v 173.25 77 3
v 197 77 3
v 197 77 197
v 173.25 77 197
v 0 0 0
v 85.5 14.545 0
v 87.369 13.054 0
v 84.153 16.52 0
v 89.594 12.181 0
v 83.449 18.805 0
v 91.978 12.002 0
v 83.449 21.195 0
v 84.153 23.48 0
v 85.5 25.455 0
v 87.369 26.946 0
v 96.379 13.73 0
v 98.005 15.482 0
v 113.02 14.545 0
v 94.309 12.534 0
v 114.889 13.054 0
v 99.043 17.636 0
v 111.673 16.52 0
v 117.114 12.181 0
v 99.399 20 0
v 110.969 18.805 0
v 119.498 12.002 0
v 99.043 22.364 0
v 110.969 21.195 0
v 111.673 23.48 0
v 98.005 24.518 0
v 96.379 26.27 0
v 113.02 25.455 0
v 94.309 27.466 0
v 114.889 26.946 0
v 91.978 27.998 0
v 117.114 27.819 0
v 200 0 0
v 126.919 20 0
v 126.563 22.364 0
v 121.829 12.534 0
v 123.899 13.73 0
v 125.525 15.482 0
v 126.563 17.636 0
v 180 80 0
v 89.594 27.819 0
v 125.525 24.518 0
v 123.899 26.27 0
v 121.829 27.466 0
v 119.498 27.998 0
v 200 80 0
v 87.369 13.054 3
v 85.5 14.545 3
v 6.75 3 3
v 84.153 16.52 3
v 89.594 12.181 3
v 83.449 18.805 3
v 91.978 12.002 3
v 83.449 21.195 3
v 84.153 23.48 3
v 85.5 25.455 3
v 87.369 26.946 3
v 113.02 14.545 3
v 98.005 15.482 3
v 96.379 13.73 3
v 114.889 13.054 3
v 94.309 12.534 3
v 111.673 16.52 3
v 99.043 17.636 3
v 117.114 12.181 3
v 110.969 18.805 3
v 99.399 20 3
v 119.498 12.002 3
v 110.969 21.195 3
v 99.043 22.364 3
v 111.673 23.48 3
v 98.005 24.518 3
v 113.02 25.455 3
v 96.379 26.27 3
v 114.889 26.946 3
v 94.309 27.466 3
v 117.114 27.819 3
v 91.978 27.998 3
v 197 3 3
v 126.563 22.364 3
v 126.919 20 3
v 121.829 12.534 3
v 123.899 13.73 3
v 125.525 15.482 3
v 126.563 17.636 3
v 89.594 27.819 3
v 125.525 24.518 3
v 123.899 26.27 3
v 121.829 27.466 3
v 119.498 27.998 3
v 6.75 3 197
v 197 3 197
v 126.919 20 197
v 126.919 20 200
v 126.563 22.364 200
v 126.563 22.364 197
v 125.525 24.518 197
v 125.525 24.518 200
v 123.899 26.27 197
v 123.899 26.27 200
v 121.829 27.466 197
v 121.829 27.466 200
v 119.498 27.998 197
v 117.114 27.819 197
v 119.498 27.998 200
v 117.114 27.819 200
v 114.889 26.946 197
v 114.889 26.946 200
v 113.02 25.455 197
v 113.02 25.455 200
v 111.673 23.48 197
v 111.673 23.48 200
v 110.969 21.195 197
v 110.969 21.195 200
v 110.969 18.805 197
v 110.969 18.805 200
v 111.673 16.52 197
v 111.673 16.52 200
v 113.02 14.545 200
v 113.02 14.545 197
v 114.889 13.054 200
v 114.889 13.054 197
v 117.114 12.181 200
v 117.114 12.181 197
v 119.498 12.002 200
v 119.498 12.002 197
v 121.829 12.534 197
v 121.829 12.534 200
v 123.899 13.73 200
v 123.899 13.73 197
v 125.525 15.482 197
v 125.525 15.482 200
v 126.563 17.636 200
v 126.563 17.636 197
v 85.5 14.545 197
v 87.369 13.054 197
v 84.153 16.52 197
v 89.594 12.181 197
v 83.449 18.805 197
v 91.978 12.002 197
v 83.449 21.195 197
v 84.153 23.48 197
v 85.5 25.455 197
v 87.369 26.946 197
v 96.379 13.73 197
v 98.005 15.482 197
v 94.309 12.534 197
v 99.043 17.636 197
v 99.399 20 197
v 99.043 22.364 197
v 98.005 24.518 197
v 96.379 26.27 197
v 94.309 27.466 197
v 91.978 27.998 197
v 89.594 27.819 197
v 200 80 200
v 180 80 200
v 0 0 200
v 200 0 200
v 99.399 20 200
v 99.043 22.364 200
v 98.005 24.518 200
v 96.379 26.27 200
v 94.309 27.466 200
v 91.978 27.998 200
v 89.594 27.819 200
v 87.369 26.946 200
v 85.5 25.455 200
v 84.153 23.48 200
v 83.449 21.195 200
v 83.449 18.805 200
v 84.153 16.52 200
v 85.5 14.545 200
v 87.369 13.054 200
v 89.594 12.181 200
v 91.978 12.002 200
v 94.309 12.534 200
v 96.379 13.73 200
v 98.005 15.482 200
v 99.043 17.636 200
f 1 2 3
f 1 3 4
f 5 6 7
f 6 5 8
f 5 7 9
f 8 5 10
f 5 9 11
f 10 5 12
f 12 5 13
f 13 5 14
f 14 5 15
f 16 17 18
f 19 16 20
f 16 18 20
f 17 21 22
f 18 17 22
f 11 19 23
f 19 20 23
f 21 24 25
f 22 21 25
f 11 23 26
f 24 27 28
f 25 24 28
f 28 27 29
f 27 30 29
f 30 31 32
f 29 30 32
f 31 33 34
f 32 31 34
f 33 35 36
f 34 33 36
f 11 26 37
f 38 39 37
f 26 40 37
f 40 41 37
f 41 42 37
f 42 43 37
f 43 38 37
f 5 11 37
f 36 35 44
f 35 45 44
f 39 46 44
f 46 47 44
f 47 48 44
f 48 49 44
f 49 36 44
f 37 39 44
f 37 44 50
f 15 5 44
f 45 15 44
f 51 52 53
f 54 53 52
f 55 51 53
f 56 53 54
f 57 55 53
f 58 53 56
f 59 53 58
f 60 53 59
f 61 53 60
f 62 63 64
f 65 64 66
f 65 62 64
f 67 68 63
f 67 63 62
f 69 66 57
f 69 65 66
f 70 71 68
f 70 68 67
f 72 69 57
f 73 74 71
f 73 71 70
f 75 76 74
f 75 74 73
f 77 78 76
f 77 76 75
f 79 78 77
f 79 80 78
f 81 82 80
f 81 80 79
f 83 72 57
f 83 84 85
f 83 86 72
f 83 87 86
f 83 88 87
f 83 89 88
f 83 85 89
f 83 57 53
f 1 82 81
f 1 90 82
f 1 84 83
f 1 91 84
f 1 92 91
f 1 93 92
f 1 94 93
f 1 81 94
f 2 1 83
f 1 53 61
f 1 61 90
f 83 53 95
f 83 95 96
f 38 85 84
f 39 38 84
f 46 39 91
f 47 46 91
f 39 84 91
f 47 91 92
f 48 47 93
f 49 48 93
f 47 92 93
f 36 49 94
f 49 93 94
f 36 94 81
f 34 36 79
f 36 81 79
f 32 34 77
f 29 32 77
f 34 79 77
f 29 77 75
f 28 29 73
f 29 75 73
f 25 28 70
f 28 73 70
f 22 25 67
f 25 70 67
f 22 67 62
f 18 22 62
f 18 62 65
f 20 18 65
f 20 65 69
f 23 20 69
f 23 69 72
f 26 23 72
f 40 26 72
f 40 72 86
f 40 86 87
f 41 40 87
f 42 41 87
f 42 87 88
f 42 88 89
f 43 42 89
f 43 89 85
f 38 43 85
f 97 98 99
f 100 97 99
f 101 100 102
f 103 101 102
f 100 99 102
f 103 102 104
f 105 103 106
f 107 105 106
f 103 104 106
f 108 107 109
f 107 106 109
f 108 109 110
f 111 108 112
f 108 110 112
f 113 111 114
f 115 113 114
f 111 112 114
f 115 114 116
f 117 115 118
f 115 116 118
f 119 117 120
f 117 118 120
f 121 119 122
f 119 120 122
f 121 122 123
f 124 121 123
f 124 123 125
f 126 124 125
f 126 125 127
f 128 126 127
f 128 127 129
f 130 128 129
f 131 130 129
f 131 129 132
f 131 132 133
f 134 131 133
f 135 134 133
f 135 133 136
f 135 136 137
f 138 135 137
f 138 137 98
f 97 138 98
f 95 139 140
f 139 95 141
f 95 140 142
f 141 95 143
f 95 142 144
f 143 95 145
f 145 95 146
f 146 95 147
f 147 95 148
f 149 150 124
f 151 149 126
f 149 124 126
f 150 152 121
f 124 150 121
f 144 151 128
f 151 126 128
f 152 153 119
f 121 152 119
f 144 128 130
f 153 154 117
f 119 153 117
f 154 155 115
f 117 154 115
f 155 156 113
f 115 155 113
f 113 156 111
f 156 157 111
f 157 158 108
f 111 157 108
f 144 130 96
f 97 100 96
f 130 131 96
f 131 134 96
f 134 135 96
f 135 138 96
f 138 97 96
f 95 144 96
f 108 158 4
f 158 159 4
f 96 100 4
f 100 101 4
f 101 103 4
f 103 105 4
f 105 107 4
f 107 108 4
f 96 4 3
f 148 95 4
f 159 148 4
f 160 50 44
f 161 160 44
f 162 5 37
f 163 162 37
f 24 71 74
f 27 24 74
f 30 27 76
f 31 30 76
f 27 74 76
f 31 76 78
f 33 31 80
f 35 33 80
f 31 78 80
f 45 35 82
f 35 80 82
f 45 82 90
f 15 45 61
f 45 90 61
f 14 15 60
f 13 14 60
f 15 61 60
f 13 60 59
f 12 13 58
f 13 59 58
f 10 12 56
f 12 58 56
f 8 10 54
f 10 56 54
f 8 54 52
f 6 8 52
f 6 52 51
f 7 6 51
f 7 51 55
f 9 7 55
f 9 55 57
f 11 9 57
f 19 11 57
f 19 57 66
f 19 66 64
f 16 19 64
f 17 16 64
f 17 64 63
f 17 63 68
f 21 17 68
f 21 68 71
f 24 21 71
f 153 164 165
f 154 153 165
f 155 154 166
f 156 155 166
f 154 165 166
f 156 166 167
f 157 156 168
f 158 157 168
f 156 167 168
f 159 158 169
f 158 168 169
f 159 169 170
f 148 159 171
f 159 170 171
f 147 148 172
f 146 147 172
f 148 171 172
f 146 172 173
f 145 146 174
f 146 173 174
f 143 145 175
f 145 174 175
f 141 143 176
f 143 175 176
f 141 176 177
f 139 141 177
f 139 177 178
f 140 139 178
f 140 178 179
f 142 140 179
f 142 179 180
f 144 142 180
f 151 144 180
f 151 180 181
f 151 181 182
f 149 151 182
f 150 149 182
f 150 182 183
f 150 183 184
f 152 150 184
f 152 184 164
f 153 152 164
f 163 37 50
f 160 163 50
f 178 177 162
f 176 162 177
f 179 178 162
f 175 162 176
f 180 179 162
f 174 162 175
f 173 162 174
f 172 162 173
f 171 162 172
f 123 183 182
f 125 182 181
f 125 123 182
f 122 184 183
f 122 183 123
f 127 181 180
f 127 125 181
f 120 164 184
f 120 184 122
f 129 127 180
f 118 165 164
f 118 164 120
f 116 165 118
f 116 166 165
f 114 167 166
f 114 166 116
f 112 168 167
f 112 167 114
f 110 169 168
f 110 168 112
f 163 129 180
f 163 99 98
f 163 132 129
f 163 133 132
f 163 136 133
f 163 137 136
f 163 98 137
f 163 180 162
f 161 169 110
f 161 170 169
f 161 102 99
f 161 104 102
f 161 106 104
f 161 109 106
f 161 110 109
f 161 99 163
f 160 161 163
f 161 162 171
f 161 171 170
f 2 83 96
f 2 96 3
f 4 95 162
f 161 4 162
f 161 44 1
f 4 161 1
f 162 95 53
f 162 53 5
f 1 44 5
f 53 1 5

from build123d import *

# Parameters (mm, degrees)
BOSS_EXTRUDE4_DEPTH = 200
SHELL2_T            = -3
SKETCH4_R           = 8.02
BOSS_EXTRUDE5_DEPTH = 3
SKETCH4_7_R         = 8.02
CUT_EXTRUDE1_DEPTH  = 4
CUT_EXTRUDE2_START  = 4
SKETCH5_R           = 8.02
CUT_EXTRUDE2_DEPTH  = 4


with BuildPart() as part:
    # Sketch1 → Boss-Extrude4 (new body)
    with BuildSketch(Plane.XY):
        Polygon((0, 0), (200, 0), (200, 80), (180, 80), align=None)
    extrude(amount=BOSS_EXTRUDE4_DEPTH)

    # Shell2
    shell2_openings = [part.faces().sort_by_distance(p)[0] for p in [
        (90, 40, 100),
    ]]
    offset(amount=SHELL2_T, openings=shell2_openings, kind=Kind.INTERSECTION)

    # Sketch4 → Boss-Extrude5 (add)
    with BuildSketch(Plane.XY.offset(200)):
        with Locations((91.379034553, 20)):
            Circle(SKETCH4_R)
        with Locations((118.899034553, 20)):
            Circle(SKETCH4_R)
    extrude(amount=-BOSS_EXTRUDE5_DEPTH)

    # Sketch4<7> → Cut-Extrude1 (cut)
    with BuildSketch(Plane.XY.offset(200)):
        with Locations((91.379034553, 20)):
            Circle(SKETCH4_7_R)
        with Locations((118.899034553, 20)):
            Circle(SKETCH4_7_R)
    extrude(amount=-CUT_EXTRUDE1_DEPTH, mode=Mode.SUBTRACT)

    # Sketch5 → Cut-Extrude2 (cut)
    with BuildSketch(Plane.XY.offset(CUT_EXTRUDE2_START)):
        with Locations((91.379034553, 20)):
            Circle(SKETCH5_R)
        with Locations((118.899034553, 20)):
            Circle(SKETCH5_R)
    extrude(amount=-CUT_EXTRUDE2_DEPTH, mode=Mode.SUBTRACT)


solid = part.part
